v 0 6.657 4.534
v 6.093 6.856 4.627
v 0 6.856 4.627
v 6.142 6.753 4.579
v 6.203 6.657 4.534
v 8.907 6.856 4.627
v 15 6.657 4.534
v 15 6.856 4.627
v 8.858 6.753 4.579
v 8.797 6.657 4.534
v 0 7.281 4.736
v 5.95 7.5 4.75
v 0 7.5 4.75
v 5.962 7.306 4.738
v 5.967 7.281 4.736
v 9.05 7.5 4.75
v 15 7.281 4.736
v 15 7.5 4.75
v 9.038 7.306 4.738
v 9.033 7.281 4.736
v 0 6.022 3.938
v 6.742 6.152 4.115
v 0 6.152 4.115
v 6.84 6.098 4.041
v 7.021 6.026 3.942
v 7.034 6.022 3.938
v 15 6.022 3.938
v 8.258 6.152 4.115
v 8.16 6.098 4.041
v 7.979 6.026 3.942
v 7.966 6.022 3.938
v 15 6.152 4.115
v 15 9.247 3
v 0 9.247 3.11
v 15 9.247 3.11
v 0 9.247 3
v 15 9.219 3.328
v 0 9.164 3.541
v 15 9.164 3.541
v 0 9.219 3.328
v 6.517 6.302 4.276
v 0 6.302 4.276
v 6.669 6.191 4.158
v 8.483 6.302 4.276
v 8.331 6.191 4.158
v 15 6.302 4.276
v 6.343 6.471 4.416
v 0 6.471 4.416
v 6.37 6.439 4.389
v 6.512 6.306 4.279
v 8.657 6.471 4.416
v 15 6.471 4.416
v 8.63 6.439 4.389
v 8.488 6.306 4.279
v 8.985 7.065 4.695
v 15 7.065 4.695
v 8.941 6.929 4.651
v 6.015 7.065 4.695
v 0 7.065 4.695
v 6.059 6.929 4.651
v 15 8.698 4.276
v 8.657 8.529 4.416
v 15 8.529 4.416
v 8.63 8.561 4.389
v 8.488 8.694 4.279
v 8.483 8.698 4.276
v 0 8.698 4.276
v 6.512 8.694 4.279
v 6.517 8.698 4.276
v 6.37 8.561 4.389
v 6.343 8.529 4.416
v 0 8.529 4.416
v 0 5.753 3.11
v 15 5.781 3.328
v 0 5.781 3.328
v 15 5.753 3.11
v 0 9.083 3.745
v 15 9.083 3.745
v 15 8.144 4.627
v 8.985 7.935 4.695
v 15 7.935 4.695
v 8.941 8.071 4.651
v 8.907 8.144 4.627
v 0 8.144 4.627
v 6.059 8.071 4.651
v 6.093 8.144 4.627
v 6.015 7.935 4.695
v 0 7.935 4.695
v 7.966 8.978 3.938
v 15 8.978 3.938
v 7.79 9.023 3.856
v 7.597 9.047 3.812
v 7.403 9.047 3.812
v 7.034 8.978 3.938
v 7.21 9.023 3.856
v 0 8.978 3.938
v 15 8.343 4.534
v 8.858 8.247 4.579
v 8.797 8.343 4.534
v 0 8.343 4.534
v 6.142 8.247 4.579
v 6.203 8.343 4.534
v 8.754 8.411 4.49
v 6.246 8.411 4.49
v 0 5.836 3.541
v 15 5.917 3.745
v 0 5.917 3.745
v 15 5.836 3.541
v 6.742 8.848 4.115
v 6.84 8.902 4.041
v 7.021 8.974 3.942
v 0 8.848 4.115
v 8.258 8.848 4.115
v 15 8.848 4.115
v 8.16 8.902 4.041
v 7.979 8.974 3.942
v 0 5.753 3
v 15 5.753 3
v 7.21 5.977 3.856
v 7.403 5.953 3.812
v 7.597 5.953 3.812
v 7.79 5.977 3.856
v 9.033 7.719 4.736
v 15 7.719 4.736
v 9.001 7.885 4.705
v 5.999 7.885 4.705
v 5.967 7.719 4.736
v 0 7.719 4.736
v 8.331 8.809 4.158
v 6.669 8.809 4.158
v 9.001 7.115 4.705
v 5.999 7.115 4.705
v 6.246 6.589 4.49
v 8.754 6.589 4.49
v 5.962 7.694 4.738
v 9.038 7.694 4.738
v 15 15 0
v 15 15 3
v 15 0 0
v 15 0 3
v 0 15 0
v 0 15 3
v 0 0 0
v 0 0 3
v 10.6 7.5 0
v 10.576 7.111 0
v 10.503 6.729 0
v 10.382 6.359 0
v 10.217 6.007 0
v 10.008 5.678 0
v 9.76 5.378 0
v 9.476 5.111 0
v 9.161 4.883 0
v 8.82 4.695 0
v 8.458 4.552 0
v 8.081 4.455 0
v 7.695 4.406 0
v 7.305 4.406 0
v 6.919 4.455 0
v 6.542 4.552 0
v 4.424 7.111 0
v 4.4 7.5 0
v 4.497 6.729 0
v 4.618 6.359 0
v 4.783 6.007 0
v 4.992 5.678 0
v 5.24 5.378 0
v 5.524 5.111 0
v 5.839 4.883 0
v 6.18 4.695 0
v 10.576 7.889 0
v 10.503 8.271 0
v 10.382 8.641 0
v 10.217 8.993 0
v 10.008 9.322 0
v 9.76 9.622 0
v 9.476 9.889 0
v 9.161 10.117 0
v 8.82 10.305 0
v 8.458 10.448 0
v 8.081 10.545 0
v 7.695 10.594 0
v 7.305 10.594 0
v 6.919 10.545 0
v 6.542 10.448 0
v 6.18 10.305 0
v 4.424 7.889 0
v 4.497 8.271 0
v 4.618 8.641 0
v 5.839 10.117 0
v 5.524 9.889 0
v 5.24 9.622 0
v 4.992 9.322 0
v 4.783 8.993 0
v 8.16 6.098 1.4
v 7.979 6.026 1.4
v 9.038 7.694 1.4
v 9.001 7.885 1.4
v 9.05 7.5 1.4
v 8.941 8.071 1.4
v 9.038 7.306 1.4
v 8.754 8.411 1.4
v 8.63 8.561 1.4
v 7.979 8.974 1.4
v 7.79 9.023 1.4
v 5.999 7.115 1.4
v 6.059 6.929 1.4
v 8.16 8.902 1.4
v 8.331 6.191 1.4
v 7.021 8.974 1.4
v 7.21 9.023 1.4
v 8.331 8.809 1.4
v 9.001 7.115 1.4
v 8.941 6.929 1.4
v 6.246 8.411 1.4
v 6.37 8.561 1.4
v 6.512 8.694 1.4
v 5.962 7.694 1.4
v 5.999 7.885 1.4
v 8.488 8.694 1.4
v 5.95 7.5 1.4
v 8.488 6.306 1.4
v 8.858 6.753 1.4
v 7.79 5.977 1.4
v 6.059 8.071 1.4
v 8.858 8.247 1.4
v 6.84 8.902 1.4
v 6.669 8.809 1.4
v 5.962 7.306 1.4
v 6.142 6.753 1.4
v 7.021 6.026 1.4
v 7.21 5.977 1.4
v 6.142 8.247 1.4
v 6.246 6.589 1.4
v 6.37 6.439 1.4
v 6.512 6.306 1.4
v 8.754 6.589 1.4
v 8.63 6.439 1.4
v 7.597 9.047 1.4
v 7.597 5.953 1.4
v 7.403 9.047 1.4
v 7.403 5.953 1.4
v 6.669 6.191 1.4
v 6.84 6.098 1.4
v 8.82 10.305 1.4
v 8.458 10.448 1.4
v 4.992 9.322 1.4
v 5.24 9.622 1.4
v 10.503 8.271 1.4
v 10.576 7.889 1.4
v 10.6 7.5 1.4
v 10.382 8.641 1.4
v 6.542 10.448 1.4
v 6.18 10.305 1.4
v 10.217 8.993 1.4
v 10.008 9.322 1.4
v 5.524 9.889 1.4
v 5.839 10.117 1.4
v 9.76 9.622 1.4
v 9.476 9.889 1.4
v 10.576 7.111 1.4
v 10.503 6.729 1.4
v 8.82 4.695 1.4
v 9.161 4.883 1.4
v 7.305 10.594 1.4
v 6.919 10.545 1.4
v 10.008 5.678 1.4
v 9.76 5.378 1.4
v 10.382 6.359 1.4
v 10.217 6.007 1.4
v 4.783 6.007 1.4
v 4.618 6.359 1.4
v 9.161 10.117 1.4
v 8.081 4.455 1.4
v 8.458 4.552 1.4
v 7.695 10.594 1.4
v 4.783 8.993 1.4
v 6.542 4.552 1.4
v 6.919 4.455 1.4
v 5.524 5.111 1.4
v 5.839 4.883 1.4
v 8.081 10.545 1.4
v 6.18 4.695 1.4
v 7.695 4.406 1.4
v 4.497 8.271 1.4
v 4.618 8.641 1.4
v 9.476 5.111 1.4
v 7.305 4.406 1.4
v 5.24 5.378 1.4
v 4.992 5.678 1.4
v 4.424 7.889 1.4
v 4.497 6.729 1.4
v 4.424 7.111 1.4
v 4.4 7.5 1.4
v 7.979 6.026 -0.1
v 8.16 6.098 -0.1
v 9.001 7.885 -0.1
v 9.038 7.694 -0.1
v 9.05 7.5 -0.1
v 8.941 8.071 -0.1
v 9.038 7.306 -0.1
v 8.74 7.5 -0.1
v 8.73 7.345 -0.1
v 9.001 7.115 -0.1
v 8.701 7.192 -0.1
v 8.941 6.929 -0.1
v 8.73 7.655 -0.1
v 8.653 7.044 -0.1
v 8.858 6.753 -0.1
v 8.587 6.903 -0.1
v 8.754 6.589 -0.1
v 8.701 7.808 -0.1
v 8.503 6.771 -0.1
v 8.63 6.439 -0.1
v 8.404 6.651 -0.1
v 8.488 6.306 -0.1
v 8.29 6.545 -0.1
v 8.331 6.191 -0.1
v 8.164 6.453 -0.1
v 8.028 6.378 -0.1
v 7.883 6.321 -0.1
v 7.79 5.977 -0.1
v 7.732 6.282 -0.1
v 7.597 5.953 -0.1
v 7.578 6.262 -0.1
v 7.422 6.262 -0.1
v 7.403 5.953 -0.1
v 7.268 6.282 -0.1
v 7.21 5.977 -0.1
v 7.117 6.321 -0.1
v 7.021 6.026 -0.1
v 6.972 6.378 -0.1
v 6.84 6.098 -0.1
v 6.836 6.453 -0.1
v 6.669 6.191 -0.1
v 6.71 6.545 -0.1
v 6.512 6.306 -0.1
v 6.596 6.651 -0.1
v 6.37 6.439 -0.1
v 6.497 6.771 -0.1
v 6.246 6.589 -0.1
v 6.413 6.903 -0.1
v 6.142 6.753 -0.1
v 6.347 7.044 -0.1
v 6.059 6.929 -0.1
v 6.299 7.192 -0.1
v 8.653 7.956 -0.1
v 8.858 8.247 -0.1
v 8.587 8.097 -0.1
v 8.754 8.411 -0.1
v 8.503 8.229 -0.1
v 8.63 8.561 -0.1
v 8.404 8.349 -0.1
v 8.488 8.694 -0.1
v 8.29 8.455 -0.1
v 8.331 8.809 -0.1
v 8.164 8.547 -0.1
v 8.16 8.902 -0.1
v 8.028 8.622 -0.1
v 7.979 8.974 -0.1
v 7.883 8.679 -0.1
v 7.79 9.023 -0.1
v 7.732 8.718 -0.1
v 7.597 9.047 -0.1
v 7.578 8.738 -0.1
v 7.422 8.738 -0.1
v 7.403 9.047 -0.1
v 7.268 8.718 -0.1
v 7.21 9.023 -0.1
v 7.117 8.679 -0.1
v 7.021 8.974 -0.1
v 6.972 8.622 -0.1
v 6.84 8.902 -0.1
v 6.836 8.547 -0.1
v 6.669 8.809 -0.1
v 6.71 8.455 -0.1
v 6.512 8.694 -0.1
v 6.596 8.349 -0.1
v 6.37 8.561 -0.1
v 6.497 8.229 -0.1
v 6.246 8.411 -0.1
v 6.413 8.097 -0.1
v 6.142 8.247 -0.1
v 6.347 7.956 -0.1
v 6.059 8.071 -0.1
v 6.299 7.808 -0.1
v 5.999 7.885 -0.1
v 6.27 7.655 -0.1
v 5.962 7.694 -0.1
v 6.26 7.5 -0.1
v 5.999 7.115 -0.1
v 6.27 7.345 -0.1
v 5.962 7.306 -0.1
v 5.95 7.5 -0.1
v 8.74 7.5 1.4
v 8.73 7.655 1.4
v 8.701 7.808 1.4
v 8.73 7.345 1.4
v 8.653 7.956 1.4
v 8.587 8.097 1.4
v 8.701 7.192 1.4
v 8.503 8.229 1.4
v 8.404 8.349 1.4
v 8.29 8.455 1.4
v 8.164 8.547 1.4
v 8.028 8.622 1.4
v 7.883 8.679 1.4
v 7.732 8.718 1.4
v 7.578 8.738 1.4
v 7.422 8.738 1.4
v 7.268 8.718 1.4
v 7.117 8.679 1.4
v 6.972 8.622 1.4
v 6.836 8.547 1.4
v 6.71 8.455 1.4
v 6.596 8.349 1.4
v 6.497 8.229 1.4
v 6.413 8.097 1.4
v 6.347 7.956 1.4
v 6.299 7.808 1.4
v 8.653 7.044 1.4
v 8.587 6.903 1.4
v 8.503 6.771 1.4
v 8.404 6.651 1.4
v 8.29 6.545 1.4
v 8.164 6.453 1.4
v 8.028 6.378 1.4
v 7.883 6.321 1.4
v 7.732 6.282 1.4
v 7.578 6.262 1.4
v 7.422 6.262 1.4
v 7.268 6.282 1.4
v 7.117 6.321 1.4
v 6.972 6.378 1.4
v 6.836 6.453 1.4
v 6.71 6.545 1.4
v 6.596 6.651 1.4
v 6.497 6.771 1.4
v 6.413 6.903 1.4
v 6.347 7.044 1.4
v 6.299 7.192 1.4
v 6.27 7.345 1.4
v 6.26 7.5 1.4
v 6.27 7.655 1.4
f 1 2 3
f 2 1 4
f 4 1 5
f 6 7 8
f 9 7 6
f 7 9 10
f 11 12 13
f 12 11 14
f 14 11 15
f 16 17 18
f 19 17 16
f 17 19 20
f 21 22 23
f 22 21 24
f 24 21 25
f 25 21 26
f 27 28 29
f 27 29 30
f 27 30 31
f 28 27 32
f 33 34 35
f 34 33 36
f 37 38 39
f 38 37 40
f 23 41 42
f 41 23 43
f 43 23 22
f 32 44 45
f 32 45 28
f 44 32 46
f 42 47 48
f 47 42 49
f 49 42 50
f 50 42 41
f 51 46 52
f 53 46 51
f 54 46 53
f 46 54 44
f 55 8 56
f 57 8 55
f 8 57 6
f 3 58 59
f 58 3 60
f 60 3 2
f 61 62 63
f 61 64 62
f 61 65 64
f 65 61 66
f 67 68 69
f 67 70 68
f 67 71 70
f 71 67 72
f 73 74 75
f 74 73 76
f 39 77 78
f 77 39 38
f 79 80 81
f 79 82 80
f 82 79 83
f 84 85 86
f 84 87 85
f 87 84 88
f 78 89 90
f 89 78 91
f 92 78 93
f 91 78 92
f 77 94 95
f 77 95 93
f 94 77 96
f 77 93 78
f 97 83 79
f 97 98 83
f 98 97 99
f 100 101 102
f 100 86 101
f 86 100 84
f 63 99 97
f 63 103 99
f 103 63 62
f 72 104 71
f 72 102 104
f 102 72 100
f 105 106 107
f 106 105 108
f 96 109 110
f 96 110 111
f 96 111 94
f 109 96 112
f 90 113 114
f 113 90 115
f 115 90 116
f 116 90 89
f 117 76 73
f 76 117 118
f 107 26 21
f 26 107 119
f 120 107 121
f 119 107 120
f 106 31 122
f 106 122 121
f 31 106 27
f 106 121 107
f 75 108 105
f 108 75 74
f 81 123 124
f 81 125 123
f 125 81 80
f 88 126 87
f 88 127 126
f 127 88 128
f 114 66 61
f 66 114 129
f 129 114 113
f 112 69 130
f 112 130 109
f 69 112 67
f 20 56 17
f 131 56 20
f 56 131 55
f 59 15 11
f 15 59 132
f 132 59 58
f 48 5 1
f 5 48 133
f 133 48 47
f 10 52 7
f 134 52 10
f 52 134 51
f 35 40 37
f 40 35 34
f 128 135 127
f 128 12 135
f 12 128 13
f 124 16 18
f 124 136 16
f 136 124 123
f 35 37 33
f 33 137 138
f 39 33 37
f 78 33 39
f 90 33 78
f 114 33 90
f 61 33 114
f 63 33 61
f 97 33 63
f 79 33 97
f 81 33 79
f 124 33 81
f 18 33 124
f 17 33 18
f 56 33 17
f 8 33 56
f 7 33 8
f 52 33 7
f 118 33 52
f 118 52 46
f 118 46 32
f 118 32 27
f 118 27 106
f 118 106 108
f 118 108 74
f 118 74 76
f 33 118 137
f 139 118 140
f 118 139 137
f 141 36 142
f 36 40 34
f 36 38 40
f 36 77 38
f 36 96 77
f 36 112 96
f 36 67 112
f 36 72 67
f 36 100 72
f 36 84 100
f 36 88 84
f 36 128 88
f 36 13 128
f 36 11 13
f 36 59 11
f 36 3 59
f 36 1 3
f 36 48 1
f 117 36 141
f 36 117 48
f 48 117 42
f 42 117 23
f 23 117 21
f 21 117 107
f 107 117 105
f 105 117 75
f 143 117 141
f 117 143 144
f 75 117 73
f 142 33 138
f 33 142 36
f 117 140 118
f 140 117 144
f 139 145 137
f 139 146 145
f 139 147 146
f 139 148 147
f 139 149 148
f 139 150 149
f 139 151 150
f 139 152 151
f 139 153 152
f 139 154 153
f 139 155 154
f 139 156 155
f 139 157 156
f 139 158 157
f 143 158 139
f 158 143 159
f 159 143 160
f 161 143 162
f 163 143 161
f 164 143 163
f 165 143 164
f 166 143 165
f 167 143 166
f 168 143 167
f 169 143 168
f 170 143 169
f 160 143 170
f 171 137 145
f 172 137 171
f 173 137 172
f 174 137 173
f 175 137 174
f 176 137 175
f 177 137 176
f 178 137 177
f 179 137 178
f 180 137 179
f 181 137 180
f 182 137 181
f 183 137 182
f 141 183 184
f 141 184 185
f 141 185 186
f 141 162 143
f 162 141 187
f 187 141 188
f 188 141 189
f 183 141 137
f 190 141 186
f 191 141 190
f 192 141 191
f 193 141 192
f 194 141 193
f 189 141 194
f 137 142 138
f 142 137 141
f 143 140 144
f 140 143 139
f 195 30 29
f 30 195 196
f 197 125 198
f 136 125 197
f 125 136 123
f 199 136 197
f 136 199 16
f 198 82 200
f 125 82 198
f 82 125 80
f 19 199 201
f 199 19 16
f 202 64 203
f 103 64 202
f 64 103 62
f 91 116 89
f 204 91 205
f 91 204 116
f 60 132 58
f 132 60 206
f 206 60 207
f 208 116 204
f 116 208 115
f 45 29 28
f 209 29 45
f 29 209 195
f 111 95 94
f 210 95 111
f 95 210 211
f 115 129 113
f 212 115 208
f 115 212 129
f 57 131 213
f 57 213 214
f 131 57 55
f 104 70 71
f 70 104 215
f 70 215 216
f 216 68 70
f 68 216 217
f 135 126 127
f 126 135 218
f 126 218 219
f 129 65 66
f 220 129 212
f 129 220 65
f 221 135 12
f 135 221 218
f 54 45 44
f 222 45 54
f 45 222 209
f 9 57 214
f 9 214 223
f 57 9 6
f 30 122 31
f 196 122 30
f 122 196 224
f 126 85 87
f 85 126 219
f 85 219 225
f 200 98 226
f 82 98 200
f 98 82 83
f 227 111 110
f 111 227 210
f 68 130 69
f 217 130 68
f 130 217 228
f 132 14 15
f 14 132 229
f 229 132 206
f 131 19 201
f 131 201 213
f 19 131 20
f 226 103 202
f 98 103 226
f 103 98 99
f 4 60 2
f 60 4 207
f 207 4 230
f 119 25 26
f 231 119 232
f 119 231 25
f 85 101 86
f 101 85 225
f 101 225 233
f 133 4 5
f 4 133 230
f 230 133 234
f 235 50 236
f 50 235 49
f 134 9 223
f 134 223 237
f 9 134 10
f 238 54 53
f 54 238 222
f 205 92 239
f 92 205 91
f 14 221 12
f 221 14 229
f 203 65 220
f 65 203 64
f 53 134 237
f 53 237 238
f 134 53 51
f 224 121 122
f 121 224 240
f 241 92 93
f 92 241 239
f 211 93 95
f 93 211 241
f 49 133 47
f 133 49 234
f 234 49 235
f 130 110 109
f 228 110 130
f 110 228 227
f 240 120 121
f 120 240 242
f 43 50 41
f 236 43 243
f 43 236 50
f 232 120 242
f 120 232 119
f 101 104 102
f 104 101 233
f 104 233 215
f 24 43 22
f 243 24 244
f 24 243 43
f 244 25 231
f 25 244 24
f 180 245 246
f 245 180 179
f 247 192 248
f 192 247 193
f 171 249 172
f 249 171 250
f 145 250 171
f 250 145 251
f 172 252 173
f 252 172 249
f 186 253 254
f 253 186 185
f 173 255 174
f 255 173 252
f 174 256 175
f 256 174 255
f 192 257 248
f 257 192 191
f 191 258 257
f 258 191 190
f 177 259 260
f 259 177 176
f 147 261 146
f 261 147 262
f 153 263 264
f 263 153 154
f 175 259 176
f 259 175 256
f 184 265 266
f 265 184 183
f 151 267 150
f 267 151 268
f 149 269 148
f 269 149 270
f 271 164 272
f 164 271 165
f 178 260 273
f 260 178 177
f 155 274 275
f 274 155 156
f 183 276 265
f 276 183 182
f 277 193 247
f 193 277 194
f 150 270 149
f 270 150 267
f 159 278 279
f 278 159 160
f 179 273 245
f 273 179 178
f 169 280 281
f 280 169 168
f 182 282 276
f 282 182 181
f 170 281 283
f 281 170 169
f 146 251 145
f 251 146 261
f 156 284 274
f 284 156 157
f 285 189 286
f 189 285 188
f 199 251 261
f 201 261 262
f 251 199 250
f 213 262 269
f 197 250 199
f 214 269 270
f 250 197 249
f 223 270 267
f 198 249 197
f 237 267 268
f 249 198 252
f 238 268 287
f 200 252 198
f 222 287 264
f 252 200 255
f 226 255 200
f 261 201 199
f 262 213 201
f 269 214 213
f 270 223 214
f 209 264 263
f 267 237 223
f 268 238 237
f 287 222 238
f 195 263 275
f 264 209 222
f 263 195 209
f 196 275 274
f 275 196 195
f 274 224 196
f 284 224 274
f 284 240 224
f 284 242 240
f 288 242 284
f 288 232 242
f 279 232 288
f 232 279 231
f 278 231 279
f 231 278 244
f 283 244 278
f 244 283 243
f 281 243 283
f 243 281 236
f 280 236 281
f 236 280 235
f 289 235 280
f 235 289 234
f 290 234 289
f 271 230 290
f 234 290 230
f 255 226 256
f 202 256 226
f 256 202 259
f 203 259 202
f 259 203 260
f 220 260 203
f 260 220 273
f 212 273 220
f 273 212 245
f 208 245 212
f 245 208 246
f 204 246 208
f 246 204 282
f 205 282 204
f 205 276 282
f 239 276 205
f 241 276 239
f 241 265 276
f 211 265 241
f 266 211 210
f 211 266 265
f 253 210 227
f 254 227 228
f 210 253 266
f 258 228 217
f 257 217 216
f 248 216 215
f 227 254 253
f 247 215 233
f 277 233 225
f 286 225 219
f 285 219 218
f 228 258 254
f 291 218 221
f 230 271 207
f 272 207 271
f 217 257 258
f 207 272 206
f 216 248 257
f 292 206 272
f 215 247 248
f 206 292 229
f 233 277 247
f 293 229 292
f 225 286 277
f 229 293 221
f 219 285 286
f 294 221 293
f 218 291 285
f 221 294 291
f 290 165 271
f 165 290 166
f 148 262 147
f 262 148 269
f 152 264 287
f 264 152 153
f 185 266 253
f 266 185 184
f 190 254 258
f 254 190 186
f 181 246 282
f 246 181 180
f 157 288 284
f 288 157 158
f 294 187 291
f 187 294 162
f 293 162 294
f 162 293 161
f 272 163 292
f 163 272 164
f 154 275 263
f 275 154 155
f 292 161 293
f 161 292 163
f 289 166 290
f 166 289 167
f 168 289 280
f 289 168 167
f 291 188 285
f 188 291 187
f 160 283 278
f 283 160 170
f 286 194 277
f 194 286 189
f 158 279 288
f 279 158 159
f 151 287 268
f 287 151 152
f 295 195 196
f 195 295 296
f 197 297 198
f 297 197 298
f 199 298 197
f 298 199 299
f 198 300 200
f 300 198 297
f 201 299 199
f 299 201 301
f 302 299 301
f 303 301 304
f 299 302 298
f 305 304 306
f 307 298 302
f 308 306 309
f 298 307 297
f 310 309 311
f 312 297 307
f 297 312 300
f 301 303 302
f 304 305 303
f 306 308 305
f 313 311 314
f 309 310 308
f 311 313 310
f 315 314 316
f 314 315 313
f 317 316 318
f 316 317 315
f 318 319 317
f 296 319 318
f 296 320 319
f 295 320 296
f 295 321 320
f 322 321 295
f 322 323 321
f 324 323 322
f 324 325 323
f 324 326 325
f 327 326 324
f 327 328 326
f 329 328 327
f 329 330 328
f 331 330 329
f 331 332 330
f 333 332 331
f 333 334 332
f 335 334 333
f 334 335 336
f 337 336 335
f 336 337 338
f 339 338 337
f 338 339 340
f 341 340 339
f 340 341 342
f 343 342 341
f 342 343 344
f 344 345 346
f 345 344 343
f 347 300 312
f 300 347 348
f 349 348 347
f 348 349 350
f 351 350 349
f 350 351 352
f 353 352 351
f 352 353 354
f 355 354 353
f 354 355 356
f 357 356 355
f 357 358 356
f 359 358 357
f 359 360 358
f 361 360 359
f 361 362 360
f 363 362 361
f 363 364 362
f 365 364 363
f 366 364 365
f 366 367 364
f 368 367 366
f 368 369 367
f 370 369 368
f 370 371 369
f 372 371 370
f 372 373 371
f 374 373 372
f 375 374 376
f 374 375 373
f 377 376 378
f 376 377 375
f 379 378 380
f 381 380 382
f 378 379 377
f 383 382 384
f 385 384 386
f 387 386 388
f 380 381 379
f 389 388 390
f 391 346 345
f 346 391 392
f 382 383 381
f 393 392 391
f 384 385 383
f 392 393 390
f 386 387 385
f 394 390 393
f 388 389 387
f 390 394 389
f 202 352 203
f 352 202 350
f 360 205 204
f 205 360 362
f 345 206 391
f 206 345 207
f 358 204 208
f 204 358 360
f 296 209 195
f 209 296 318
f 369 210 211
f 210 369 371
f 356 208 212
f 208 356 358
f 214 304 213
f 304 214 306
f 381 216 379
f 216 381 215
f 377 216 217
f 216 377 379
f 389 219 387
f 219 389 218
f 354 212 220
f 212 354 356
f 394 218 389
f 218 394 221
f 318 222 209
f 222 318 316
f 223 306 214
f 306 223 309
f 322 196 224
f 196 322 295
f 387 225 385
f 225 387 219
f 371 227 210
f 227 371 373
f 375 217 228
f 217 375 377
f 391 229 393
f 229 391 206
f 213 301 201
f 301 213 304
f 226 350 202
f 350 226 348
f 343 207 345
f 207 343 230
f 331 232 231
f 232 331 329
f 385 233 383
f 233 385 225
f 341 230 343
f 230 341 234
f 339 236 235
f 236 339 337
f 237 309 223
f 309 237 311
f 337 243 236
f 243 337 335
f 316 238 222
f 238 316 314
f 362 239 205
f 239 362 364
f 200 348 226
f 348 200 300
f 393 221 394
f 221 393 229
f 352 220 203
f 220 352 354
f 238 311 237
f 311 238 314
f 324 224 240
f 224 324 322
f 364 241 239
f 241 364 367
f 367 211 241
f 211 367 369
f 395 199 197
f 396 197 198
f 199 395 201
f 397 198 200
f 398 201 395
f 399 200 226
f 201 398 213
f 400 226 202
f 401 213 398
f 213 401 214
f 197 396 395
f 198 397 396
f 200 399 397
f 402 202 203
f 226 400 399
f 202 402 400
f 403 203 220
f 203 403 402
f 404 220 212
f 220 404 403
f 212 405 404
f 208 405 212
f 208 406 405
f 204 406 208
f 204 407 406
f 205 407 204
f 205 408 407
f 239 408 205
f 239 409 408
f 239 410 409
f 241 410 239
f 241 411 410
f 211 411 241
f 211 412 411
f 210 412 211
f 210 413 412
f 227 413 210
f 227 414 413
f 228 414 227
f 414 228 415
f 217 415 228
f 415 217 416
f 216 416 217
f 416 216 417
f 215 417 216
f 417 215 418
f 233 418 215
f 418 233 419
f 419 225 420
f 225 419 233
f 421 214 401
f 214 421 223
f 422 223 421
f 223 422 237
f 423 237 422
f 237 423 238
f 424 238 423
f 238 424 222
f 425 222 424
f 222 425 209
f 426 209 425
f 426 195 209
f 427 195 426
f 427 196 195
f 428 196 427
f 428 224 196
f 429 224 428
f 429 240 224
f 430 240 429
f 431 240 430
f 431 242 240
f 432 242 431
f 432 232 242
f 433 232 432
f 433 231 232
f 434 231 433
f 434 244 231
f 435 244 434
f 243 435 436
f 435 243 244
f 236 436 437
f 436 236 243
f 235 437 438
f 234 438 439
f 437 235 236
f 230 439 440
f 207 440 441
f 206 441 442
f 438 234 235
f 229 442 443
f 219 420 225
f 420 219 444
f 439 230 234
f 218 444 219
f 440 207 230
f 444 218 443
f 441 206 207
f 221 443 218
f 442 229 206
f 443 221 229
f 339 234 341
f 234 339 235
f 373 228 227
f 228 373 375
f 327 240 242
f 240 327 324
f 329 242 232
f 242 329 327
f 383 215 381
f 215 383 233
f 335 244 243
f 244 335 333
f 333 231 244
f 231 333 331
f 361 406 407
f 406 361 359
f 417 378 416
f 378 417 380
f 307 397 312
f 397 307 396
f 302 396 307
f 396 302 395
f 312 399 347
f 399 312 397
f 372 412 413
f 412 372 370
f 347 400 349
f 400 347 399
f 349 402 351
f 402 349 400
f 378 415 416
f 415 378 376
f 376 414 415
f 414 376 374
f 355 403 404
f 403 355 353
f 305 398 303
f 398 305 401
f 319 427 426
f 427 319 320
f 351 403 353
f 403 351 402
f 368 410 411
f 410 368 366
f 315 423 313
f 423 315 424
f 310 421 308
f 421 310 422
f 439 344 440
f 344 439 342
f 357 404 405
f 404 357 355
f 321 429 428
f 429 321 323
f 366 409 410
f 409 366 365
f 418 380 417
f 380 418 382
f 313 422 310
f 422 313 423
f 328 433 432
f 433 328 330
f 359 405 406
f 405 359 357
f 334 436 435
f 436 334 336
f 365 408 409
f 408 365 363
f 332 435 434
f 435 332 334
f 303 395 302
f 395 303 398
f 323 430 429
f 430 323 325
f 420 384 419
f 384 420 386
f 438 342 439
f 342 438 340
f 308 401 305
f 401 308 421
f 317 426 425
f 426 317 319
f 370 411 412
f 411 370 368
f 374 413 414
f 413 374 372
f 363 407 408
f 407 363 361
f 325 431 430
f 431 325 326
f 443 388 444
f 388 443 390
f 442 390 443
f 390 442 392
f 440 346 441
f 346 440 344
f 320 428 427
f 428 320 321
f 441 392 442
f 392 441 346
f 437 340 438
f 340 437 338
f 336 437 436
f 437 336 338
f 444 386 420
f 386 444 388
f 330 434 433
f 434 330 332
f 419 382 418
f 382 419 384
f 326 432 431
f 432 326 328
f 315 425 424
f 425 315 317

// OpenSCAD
// RAMPS bracket for Deltatron by Mikrotron d.o.o.

// smoothing of curves
$fn = 50;

// extra dimension to remove ambiguity of walls
ex = 0.10;

// aluminium extrusion dimension
profile = 15;
profile_gap = 3.6; // frame groove width

// screw dimensions
screw_3x8_cap_dia = 6.2;
screw_3x8_cap_height = 3.2;

// bracket dimensions
wall = 3;

// ENTRY POINT

ramps_bracket();

module ramps_bracket(){
    translate([0, -profile, 0]) %frame();
    frame_mount();

}

module frame_mount(){
    // part of bracket used for mounting on frame
    // top part
    difference(){
        union(){
            cube([profile, profile, wall]);
            translate([0, profile/2, wall]) slider();
        }
        translate([profile/2, profile/2, -ex]) cylinder(d = screw_3x8_cap_dia/2, h = wall+2);
        translate([profile/2, profile/2, -ex]) cylinder(d = screw_3x8_cap_dia, h = wall/2);
    }
    // temp support
    difference(){
        translate([profile/2, profile/2, -ex]) cylinder(d = screw_3x8_cap_dia/2, h = wall/2);
        translate([profile/2, profile/2, -2*ex]) cylinder(d = screw_3x8_cap_dia/2.5, h = wall/2 + 2*ex);
    }
}

module slider(slider_length = profile){
    // part that slides in frame groove
    difference(){
        rotate([0,90,0]) cylinder(d = profile_gap - ex, h = slider_length);
        translate([-ex, -profile_gap/2 - 2*ex, -profile_gap/2 - 2*ex])
            cube([slider_length + 2*ex, profile_gap + 2*ex, profile_gap/2 + 2*ex]);
    }
}

module frame(profile_length = 200){
    // draws basic aluminium extrusion frame
    difference(){
        cube([profile_length, profile, profile]);
        translate([-ex, profile/2 - profile_gap/2, profile - profile_gap])
            cube([profile_length + 2*ex, profile_gap, profile_gap + ex]);
        translate([-ex, profile - profile_gap, profile/2 - profile_gap/2])
            cube([profile_length + 2*ex, profile_gap + ex, profile_gap]);
        translate([-ex, -ex, profile/2 - profile_gap/2])
            cube([profile_length + 2*ex, profile_gap + ex, profile_gap]);
        translate([-ex, profile/2 - profile_gap/2, -ex])
            cube([profile_length + 2*ex, profile_gap, profile_gap + ex]);
    }
}
